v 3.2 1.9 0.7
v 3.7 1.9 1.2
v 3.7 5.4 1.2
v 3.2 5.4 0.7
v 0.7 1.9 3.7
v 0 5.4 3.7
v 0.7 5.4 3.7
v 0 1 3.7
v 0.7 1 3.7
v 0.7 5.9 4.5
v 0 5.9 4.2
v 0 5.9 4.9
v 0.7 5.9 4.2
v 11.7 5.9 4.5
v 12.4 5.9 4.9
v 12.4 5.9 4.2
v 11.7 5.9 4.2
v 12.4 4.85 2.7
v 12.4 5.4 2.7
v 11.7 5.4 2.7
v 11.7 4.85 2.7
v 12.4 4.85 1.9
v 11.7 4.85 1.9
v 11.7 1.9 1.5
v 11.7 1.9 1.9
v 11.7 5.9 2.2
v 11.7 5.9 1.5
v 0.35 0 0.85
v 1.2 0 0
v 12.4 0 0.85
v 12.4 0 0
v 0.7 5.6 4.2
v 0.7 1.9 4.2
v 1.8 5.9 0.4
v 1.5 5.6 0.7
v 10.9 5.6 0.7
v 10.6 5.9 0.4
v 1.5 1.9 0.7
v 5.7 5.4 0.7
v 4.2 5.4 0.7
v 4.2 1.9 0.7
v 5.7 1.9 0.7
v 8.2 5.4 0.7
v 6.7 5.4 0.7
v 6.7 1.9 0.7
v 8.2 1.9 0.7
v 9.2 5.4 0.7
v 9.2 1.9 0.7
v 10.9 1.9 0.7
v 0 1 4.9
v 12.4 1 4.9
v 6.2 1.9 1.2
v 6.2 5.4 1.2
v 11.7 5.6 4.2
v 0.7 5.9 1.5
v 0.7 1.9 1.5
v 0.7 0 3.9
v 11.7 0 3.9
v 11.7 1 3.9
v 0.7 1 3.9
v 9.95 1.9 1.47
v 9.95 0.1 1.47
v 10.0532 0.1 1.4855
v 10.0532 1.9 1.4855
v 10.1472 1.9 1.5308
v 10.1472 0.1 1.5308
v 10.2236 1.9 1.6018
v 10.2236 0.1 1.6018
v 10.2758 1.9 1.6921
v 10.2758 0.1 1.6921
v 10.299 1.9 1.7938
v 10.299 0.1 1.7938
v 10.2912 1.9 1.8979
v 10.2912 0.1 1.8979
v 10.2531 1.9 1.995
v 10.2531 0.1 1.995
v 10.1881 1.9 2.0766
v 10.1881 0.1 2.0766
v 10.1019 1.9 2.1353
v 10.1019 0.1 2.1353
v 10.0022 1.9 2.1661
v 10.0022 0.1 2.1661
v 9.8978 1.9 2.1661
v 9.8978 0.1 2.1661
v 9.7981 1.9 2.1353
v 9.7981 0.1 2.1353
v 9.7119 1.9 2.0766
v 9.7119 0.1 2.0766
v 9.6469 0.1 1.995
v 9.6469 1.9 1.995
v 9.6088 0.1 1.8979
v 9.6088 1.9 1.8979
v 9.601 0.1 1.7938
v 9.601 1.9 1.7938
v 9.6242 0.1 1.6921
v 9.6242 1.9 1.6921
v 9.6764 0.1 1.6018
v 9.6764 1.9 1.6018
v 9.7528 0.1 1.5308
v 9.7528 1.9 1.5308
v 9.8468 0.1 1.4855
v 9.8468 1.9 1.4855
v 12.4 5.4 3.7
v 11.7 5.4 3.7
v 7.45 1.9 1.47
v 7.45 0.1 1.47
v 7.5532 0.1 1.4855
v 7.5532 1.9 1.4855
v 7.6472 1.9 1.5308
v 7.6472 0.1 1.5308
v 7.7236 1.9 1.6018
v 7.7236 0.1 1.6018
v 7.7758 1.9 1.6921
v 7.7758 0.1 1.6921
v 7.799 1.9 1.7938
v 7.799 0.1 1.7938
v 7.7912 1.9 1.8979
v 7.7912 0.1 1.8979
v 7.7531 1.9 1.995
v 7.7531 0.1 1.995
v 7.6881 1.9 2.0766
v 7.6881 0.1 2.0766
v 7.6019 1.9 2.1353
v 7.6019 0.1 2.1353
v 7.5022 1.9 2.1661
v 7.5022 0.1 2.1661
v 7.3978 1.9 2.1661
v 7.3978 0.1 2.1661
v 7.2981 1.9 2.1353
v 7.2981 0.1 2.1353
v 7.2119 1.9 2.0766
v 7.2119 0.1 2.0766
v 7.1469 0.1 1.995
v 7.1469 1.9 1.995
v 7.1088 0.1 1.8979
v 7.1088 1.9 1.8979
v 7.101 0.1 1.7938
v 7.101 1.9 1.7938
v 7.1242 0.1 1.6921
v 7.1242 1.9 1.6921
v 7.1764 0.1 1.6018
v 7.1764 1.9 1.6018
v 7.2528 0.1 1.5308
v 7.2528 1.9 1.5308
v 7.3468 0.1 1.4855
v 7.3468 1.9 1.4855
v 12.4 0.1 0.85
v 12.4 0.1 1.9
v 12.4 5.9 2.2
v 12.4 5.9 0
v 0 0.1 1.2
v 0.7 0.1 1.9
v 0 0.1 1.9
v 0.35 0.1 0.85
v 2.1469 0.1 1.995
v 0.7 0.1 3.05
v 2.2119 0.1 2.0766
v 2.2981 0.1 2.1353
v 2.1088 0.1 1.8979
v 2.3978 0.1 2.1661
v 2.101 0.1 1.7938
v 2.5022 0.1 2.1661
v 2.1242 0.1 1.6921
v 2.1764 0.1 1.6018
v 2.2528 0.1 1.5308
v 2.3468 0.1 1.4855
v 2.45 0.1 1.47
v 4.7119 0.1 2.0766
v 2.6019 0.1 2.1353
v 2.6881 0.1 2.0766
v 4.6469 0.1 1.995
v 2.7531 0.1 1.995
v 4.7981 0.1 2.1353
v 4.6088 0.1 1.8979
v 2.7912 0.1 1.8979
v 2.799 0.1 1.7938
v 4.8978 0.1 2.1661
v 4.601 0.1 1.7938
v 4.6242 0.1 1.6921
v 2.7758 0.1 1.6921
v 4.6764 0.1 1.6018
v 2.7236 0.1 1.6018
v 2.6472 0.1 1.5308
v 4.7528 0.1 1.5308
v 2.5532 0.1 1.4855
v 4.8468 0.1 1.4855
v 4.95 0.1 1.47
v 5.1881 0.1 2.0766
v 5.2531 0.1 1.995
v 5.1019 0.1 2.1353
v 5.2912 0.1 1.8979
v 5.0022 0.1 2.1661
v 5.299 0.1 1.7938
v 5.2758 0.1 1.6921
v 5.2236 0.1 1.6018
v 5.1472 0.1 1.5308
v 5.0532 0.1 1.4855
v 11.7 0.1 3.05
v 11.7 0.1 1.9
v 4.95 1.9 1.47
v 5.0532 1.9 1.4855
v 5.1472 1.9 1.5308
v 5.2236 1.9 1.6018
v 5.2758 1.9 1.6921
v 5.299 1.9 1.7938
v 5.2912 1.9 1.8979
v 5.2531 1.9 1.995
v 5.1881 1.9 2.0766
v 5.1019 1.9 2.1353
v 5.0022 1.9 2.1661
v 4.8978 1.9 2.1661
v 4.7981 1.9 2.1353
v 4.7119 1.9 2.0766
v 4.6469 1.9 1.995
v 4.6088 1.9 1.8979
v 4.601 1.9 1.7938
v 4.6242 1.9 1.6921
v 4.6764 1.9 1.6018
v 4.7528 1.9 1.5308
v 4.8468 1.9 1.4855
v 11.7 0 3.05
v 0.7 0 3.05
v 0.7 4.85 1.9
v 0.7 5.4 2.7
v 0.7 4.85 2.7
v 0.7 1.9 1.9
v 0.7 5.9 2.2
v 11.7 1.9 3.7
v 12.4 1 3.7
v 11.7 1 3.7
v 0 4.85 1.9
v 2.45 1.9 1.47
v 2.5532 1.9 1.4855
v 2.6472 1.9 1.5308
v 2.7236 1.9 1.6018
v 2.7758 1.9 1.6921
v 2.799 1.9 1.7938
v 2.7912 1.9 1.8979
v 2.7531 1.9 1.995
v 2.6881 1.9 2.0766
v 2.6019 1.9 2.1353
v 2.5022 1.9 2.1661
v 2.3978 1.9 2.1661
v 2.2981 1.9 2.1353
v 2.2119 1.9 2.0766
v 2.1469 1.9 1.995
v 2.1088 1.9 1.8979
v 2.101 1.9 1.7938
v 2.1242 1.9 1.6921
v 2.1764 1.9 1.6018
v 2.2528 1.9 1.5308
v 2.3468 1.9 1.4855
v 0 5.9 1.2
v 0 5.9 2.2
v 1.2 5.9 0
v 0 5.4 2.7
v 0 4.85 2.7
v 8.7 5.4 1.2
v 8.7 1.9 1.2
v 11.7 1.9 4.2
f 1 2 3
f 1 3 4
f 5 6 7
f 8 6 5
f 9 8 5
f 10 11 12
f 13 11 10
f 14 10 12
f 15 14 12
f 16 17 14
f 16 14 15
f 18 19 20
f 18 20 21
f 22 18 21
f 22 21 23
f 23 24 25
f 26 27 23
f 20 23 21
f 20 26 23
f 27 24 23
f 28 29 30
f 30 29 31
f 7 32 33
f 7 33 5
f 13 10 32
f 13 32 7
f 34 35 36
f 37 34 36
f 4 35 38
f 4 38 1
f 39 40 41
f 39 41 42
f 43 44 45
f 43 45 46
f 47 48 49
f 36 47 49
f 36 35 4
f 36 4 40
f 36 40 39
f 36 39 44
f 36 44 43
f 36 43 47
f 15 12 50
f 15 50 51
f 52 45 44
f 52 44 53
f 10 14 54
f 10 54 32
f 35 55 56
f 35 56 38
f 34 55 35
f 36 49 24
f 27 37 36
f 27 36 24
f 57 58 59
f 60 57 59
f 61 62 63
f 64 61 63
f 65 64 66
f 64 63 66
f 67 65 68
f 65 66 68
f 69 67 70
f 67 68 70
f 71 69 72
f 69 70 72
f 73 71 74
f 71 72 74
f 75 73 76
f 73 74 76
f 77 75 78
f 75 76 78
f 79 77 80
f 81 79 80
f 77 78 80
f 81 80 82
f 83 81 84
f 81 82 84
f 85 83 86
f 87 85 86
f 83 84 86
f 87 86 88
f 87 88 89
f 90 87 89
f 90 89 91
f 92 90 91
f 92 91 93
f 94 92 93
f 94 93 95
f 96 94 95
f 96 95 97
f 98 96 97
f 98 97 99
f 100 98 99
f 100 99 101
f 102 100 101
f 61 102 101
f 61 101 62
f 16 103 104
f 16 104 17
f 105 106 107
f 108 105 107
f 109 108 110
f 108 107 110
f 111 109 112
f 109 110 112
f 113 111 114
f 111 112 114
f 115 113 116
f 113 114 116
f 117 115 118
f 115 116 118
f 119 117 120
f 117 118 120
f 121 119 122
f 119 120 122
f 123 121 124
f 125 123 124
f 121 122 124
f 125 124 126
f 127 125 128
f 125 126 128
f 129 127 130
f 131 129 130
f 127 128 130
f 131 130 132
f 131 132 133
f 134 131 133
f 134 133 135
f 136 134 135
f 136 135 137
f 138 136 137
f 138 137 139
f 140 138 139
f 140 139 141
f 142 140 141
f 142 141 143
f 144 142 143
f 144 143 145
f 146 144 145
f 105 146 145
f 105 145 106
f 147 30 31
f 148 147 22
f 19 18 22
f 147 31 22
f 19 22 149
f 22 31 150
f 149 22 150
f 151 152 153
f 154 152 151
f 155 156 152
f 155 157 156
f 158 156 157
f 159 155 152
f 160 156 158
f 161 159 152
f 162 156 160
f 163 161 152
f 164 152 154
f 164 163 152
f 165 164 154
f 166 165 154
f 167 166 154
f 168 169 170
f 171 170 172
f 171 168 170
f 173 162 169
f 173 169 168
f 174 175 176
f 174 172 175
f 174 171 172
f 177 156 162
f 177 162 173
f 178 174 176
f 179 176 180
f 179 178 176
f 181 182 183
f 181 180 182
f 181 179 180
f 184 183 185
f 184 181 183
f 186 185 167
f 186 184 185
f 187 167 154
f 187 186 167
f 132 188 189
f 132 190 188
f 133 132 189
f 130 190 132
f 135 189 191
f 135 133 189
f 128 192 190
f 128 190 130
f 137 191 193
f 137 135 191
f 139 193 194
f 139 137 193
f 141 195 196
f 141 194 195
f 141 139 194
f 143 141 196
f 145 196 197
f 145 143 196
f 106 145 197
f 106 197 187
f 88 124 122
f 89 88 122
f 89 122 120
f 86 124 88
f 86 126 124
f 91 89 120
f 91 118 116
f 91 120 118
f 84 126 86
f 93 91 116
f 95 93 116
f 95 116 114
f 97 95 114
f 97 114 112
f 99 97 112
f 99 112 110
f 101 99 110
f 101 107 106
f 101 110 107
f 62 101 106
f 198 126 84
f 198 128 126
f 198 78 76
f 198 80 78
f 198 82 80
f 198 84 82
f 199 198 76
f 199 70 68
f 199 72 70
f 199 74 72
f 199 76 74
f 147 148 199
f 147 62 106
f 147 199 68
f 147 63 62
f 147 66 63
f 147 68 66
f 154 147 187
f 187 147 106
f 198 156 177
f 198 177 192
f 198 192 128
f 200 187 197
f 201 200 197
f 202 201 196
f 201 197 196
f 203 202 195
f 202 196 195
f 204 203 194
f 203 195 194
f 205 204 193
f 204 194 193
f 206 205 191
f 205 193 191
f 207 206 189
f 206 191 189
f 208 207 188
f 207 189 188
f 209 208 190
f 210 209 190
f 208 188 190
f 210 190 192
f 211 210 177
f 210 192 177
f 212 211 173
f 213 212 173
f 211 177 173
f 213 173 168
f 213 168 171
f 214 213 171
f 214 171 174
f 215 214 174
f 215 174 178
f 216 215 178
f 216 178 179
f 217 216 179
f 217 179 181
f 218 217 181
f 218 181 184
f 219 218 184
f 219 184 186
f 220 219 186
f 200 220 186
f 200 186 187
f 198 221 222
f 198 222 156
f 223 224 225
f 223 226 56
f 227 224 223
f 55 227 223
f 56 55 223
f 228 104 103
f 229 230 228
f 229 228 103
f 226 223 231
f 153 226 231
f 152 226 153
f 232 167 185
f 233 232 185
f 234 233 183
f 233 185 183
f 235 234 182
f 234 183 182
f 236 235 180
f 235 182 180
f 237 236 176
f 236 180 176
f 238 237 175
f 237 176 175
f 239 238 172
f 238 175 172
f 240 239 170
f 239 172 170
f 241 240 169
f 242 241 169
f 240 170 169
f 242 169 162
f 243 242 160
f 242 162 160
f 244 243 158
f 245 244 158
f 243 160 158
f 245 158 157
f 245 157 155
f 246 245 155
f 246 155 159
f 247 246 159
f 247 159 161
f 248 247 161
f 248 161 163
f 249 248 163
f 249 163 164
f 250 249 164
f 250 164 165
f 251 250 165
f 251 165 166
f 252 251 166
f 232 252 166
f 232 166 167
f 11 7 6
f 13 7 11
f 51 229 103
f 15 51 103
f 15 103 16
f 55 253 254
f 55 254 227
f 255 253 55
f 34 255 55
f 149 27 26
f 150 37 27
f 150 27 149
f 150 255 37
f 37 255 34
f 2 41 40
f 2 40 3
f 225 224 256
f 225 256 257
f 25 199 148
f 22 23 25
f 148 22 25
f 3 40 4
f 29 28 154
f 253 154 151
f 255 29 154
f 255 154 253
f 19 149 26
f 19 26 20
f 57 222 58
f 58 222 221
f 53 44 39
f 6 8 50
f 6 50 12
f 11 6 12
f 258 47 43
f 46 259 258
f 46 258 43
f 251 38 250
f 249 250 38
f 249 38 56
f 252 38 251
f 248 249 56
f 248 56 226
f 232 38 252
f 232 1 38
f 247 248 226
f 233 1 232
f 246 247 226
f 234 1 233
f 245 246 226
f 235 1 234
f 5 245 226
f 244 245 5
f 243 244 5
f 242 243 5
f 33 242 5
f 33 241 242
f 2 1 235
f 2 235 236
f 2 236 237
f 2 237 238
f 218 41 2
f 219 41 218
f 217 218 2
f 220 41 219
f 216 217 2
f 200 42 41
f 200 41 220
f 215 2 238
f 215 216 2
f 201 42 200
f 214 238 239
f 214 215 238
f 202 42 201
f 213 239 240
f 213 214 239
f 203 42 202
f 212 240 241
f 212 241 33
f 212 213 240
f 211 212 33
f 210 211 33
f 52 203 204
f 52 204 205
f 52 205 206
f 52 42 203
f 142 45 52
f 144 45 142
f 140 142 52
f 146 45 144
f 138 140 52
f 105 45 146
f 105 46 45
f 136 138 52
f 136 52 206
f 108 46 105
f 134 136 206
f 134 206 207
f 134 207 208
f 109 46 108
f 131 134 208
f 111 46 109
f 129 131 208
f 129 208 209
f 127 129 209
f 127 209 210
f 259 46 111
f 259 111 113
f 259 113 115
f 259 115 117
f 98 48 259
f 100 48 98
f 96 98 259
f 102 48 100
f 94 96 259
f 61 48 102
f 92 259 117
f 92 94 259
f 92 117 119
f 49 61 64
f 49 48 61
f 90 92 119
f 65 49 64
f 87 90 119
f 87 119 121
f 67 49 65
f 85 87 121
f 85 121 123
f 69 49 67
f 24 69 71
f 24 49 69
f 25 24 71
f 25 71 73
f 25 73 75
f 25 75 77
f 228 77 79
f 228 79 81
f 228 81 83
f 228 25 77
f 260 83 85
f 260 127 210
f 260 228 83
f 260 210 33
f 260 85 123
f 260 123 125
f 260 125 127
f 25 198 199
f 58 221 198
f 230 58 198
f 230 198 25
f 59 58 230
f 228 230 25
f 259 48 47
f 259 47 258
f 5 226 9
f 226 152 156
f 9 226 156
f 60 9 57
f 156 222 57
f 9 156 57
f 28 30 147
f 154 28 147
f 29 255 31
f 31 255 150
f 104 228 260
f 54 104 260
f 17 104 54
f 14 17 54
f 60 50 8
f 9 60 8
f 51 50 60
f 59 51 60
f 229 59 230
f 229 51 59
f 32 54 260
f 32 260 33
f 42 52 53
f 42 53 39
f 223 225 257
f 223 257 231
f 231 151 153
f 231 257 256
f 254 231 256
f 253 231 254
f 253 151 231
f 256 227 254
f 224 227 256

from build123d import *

# Parameters (mm, degrees)
SKETCH_1_W             = 12.4
SKETCH_1_H             = 5.9
EXTRUDE_1_DEPTH        = 4.9
CUT_EXTRUDE_1_DEPTH    = 4
SKETCH_4_W             = 1
SKETCH_4_H             = 1
SKETCH_4_W_2           = 2.2
SKETCH_4_H_2           = 0.1
CUT_EXTRUDE_2_DEPTH    = 15.580123456
SKETCH_5_W             = 0.7
SKETCH_5_H             = 1
CUT_EXTRUDE_3_DEPTH    = 2
CHAMFER_1_SIZE         = 1.2
SKETCH_6_R             = 0.35
CUT_EXTRUDE_4_DEPTH    = 15.539944979
PATTERN_LINEAR_1_COUNT = 4
PATTERN_LINEAR_1_PITCH = 2.5
CUT_EXTRUDE_5_REACH    = 16.205
SKETCH_7_W             = 0.7
SKETCH_7_H             = 1.8
EXTRUDE_2_DEPTH        = 3.5
PATTERN_LINEAR_2_COUNT = 3
PATTERN_LINEAR_2_PITCH = 2.5
CHAMFER_2_SIZE         = 0.3


with BuildPart() as part:
    # 스케치1 → 보스-돌출1 (new body)
    with BuildSketch(Plane.XY):
        with Locations((6.2, 2.95)):
            Rectangle(SKETCH_1_W, SKETCH_1_H)
    extrude(amount=EXTRUDE_1_DEPTH)

    # 스케치2 → 컷-돌출1 (cut)
    with BuildSketch(Plane(origin=(0, 5.9, 0), x_dir=(1, 0, 0), z_dir=(0, 1, 0))):
        Polygon((0.7, -1.5), (1.5, -0.7), (10.9, -0.7), (11.7, -1.5), (11.7, -4.2), (0.7, -4.2), align=None)
    extrude(amount=-CUT_EXTRUDE_1_DEPTH, mode=Mode.SUBTRACT)

    # 스케치4 → 컷-돌출2 (cut, through all)
    with BuildSketch(Plane(origin=(12.4, 0, 0), x_dir=(0, 0, -1), z_dir=(1, 0, 0))):
        with Locations((-4.4, 0.5)):
            Rectangle(SKETCH_4_W, SKETCH_4_H)
        with Locations((-1.95, 0.05)):
            Rectangle(SKETCH_4_W_2, SKETCH_4_H_2)
        Polygon((-3.7, 5.4), (-4.2, 5.9), (-2.2, 5.9), (-2.7, 5.4), (-2.7, 4.85), (-1.9, 4.85), (-1.9, 1.9), (-3.7, 1.9), align=None)
    extrude(amount=-CUT_EXTRUDE_2_DEPTH, mode=Mode.SUBTRACT)

    # 스케치5 → 컷-돌출3 (cut)
    with BuildSketch(Plane.XY.offset(3.9)):
        with Locations((0.35, 0.5)):
            Rectangle(SKETCH_5_W, SKETCH_5_H)
        with Locations((12.05, 0.5)):
            Rectangle(SKETCH_5_W, SKETCH_5_H)
    extrude(amount=-CUT_EXTRUDE_3_DEPTH, mode=Mode.SUBTRACT)

    # 모따기1
    chamfer_1_edges = [part.edges().sort_by_distance(p)[0] for p in [
        (0, 2.95, 0),
    ]]
    chamfer(chamfer_1_edges, length=CHAMFER_1_SIZE)

    # 스케치6 → 컷-돌출4 (cut, through all)
    with BuildSketch(Plane.XZ.offset(-0.1)):
        with Locations(Location((2.45, 1.82, 0), (0, 0, 270))):
            Circle(SKETCH_6_R)
    cut_extrude_4 = extrude(amount=-CUT_EXTRUDE_4_DEPTH, mode=Mode.SUBTRACT)

    # 선형 패턴1: 컷-돌출4 ×4
    with Locations(*[(i * PATTERN_LINEAR_1_PITCH, 0, 0) for i in range(1, PATTERN_LINEAR_1_COUNT)]):
        add(cut_extrude_4, mode=Mode.SUBTRACT)

    # 스케치7 → 컷-돌출5 (cut, up to next)
    with BuildSketch(Plane.XZ.offset(-1), mode=Mode.PRIVATE) as cut_extrude_5_sk1:
        with Locations((0.35, 2.8)):
            Rectangle(SKETCH_7_W, SKETCH_7_H)
    cut_extrude_5_tool1 = extrude(cut_extrude_5_sk1.sketch, amount=-CUT_EXTRUDE_5_REACH, mode=Mode.PRIVATE) & part.part
    # 스케치7 → 컷-돌출5 (cut, up to next)
    with BuildSketch(Plane.XZ.offset(-1), mode=Mode.PRIVATE) as cut_extrude_5_sk2:
        with Locations((12.05, 2.8)):
            Rectangle(SKETCH_7_W, SKETCH_7_H)
    cut_extrude_5_tool2 = extrude(cut_extrude_5_sk2.sketch, amount=-CUT_EXTRUDE_5_REACH, mode=Mode.PRIVATE) & part.part
    add(cut_extrude_5_tool1.solids().sort_by_distance((0.35, 1, 2.8))[0], mode=Mode.SUBTRACT)
    add(cut_extrude_5_tool2.solids().sort_by_distance((12.05, 1, 2.8))[0], mode=Mode.SUBTRACT)

    # 스케치8 → 보스-돌출2 (add)
    with BuildSketch(Plane(origin=(0, 1.9, 0), x_dir=(1, 0, 0), z_dir=(0, 1, 0))):
        Polygon((3.2, -0.7), (4.2, -0.7), (3.7, -1.2), align=None)
    extrude_2 = extrude(amount=EXTRUDE_2_DEPTH)

    # 선형 패턴2: 보스-돌출2 ×3
    with Locations(*[(i * PATTERN_LINEAR_2_PITCH, 0, 0) for i in range(1, PATTERN_LINEAR_2_COUNT)]):
        add(extrude_2)

    # 모따기2
    chamfer_2_edges = [part.edges().sort_by_distance(p)[0] for p in [
        (6.2, 5.9, 0.7),
        (6.2, 5.9, 4.2),
    ]]
    chamfer(chamfer_2_edges, length=CHAMFER_2_SIZE)


solid = part.part
